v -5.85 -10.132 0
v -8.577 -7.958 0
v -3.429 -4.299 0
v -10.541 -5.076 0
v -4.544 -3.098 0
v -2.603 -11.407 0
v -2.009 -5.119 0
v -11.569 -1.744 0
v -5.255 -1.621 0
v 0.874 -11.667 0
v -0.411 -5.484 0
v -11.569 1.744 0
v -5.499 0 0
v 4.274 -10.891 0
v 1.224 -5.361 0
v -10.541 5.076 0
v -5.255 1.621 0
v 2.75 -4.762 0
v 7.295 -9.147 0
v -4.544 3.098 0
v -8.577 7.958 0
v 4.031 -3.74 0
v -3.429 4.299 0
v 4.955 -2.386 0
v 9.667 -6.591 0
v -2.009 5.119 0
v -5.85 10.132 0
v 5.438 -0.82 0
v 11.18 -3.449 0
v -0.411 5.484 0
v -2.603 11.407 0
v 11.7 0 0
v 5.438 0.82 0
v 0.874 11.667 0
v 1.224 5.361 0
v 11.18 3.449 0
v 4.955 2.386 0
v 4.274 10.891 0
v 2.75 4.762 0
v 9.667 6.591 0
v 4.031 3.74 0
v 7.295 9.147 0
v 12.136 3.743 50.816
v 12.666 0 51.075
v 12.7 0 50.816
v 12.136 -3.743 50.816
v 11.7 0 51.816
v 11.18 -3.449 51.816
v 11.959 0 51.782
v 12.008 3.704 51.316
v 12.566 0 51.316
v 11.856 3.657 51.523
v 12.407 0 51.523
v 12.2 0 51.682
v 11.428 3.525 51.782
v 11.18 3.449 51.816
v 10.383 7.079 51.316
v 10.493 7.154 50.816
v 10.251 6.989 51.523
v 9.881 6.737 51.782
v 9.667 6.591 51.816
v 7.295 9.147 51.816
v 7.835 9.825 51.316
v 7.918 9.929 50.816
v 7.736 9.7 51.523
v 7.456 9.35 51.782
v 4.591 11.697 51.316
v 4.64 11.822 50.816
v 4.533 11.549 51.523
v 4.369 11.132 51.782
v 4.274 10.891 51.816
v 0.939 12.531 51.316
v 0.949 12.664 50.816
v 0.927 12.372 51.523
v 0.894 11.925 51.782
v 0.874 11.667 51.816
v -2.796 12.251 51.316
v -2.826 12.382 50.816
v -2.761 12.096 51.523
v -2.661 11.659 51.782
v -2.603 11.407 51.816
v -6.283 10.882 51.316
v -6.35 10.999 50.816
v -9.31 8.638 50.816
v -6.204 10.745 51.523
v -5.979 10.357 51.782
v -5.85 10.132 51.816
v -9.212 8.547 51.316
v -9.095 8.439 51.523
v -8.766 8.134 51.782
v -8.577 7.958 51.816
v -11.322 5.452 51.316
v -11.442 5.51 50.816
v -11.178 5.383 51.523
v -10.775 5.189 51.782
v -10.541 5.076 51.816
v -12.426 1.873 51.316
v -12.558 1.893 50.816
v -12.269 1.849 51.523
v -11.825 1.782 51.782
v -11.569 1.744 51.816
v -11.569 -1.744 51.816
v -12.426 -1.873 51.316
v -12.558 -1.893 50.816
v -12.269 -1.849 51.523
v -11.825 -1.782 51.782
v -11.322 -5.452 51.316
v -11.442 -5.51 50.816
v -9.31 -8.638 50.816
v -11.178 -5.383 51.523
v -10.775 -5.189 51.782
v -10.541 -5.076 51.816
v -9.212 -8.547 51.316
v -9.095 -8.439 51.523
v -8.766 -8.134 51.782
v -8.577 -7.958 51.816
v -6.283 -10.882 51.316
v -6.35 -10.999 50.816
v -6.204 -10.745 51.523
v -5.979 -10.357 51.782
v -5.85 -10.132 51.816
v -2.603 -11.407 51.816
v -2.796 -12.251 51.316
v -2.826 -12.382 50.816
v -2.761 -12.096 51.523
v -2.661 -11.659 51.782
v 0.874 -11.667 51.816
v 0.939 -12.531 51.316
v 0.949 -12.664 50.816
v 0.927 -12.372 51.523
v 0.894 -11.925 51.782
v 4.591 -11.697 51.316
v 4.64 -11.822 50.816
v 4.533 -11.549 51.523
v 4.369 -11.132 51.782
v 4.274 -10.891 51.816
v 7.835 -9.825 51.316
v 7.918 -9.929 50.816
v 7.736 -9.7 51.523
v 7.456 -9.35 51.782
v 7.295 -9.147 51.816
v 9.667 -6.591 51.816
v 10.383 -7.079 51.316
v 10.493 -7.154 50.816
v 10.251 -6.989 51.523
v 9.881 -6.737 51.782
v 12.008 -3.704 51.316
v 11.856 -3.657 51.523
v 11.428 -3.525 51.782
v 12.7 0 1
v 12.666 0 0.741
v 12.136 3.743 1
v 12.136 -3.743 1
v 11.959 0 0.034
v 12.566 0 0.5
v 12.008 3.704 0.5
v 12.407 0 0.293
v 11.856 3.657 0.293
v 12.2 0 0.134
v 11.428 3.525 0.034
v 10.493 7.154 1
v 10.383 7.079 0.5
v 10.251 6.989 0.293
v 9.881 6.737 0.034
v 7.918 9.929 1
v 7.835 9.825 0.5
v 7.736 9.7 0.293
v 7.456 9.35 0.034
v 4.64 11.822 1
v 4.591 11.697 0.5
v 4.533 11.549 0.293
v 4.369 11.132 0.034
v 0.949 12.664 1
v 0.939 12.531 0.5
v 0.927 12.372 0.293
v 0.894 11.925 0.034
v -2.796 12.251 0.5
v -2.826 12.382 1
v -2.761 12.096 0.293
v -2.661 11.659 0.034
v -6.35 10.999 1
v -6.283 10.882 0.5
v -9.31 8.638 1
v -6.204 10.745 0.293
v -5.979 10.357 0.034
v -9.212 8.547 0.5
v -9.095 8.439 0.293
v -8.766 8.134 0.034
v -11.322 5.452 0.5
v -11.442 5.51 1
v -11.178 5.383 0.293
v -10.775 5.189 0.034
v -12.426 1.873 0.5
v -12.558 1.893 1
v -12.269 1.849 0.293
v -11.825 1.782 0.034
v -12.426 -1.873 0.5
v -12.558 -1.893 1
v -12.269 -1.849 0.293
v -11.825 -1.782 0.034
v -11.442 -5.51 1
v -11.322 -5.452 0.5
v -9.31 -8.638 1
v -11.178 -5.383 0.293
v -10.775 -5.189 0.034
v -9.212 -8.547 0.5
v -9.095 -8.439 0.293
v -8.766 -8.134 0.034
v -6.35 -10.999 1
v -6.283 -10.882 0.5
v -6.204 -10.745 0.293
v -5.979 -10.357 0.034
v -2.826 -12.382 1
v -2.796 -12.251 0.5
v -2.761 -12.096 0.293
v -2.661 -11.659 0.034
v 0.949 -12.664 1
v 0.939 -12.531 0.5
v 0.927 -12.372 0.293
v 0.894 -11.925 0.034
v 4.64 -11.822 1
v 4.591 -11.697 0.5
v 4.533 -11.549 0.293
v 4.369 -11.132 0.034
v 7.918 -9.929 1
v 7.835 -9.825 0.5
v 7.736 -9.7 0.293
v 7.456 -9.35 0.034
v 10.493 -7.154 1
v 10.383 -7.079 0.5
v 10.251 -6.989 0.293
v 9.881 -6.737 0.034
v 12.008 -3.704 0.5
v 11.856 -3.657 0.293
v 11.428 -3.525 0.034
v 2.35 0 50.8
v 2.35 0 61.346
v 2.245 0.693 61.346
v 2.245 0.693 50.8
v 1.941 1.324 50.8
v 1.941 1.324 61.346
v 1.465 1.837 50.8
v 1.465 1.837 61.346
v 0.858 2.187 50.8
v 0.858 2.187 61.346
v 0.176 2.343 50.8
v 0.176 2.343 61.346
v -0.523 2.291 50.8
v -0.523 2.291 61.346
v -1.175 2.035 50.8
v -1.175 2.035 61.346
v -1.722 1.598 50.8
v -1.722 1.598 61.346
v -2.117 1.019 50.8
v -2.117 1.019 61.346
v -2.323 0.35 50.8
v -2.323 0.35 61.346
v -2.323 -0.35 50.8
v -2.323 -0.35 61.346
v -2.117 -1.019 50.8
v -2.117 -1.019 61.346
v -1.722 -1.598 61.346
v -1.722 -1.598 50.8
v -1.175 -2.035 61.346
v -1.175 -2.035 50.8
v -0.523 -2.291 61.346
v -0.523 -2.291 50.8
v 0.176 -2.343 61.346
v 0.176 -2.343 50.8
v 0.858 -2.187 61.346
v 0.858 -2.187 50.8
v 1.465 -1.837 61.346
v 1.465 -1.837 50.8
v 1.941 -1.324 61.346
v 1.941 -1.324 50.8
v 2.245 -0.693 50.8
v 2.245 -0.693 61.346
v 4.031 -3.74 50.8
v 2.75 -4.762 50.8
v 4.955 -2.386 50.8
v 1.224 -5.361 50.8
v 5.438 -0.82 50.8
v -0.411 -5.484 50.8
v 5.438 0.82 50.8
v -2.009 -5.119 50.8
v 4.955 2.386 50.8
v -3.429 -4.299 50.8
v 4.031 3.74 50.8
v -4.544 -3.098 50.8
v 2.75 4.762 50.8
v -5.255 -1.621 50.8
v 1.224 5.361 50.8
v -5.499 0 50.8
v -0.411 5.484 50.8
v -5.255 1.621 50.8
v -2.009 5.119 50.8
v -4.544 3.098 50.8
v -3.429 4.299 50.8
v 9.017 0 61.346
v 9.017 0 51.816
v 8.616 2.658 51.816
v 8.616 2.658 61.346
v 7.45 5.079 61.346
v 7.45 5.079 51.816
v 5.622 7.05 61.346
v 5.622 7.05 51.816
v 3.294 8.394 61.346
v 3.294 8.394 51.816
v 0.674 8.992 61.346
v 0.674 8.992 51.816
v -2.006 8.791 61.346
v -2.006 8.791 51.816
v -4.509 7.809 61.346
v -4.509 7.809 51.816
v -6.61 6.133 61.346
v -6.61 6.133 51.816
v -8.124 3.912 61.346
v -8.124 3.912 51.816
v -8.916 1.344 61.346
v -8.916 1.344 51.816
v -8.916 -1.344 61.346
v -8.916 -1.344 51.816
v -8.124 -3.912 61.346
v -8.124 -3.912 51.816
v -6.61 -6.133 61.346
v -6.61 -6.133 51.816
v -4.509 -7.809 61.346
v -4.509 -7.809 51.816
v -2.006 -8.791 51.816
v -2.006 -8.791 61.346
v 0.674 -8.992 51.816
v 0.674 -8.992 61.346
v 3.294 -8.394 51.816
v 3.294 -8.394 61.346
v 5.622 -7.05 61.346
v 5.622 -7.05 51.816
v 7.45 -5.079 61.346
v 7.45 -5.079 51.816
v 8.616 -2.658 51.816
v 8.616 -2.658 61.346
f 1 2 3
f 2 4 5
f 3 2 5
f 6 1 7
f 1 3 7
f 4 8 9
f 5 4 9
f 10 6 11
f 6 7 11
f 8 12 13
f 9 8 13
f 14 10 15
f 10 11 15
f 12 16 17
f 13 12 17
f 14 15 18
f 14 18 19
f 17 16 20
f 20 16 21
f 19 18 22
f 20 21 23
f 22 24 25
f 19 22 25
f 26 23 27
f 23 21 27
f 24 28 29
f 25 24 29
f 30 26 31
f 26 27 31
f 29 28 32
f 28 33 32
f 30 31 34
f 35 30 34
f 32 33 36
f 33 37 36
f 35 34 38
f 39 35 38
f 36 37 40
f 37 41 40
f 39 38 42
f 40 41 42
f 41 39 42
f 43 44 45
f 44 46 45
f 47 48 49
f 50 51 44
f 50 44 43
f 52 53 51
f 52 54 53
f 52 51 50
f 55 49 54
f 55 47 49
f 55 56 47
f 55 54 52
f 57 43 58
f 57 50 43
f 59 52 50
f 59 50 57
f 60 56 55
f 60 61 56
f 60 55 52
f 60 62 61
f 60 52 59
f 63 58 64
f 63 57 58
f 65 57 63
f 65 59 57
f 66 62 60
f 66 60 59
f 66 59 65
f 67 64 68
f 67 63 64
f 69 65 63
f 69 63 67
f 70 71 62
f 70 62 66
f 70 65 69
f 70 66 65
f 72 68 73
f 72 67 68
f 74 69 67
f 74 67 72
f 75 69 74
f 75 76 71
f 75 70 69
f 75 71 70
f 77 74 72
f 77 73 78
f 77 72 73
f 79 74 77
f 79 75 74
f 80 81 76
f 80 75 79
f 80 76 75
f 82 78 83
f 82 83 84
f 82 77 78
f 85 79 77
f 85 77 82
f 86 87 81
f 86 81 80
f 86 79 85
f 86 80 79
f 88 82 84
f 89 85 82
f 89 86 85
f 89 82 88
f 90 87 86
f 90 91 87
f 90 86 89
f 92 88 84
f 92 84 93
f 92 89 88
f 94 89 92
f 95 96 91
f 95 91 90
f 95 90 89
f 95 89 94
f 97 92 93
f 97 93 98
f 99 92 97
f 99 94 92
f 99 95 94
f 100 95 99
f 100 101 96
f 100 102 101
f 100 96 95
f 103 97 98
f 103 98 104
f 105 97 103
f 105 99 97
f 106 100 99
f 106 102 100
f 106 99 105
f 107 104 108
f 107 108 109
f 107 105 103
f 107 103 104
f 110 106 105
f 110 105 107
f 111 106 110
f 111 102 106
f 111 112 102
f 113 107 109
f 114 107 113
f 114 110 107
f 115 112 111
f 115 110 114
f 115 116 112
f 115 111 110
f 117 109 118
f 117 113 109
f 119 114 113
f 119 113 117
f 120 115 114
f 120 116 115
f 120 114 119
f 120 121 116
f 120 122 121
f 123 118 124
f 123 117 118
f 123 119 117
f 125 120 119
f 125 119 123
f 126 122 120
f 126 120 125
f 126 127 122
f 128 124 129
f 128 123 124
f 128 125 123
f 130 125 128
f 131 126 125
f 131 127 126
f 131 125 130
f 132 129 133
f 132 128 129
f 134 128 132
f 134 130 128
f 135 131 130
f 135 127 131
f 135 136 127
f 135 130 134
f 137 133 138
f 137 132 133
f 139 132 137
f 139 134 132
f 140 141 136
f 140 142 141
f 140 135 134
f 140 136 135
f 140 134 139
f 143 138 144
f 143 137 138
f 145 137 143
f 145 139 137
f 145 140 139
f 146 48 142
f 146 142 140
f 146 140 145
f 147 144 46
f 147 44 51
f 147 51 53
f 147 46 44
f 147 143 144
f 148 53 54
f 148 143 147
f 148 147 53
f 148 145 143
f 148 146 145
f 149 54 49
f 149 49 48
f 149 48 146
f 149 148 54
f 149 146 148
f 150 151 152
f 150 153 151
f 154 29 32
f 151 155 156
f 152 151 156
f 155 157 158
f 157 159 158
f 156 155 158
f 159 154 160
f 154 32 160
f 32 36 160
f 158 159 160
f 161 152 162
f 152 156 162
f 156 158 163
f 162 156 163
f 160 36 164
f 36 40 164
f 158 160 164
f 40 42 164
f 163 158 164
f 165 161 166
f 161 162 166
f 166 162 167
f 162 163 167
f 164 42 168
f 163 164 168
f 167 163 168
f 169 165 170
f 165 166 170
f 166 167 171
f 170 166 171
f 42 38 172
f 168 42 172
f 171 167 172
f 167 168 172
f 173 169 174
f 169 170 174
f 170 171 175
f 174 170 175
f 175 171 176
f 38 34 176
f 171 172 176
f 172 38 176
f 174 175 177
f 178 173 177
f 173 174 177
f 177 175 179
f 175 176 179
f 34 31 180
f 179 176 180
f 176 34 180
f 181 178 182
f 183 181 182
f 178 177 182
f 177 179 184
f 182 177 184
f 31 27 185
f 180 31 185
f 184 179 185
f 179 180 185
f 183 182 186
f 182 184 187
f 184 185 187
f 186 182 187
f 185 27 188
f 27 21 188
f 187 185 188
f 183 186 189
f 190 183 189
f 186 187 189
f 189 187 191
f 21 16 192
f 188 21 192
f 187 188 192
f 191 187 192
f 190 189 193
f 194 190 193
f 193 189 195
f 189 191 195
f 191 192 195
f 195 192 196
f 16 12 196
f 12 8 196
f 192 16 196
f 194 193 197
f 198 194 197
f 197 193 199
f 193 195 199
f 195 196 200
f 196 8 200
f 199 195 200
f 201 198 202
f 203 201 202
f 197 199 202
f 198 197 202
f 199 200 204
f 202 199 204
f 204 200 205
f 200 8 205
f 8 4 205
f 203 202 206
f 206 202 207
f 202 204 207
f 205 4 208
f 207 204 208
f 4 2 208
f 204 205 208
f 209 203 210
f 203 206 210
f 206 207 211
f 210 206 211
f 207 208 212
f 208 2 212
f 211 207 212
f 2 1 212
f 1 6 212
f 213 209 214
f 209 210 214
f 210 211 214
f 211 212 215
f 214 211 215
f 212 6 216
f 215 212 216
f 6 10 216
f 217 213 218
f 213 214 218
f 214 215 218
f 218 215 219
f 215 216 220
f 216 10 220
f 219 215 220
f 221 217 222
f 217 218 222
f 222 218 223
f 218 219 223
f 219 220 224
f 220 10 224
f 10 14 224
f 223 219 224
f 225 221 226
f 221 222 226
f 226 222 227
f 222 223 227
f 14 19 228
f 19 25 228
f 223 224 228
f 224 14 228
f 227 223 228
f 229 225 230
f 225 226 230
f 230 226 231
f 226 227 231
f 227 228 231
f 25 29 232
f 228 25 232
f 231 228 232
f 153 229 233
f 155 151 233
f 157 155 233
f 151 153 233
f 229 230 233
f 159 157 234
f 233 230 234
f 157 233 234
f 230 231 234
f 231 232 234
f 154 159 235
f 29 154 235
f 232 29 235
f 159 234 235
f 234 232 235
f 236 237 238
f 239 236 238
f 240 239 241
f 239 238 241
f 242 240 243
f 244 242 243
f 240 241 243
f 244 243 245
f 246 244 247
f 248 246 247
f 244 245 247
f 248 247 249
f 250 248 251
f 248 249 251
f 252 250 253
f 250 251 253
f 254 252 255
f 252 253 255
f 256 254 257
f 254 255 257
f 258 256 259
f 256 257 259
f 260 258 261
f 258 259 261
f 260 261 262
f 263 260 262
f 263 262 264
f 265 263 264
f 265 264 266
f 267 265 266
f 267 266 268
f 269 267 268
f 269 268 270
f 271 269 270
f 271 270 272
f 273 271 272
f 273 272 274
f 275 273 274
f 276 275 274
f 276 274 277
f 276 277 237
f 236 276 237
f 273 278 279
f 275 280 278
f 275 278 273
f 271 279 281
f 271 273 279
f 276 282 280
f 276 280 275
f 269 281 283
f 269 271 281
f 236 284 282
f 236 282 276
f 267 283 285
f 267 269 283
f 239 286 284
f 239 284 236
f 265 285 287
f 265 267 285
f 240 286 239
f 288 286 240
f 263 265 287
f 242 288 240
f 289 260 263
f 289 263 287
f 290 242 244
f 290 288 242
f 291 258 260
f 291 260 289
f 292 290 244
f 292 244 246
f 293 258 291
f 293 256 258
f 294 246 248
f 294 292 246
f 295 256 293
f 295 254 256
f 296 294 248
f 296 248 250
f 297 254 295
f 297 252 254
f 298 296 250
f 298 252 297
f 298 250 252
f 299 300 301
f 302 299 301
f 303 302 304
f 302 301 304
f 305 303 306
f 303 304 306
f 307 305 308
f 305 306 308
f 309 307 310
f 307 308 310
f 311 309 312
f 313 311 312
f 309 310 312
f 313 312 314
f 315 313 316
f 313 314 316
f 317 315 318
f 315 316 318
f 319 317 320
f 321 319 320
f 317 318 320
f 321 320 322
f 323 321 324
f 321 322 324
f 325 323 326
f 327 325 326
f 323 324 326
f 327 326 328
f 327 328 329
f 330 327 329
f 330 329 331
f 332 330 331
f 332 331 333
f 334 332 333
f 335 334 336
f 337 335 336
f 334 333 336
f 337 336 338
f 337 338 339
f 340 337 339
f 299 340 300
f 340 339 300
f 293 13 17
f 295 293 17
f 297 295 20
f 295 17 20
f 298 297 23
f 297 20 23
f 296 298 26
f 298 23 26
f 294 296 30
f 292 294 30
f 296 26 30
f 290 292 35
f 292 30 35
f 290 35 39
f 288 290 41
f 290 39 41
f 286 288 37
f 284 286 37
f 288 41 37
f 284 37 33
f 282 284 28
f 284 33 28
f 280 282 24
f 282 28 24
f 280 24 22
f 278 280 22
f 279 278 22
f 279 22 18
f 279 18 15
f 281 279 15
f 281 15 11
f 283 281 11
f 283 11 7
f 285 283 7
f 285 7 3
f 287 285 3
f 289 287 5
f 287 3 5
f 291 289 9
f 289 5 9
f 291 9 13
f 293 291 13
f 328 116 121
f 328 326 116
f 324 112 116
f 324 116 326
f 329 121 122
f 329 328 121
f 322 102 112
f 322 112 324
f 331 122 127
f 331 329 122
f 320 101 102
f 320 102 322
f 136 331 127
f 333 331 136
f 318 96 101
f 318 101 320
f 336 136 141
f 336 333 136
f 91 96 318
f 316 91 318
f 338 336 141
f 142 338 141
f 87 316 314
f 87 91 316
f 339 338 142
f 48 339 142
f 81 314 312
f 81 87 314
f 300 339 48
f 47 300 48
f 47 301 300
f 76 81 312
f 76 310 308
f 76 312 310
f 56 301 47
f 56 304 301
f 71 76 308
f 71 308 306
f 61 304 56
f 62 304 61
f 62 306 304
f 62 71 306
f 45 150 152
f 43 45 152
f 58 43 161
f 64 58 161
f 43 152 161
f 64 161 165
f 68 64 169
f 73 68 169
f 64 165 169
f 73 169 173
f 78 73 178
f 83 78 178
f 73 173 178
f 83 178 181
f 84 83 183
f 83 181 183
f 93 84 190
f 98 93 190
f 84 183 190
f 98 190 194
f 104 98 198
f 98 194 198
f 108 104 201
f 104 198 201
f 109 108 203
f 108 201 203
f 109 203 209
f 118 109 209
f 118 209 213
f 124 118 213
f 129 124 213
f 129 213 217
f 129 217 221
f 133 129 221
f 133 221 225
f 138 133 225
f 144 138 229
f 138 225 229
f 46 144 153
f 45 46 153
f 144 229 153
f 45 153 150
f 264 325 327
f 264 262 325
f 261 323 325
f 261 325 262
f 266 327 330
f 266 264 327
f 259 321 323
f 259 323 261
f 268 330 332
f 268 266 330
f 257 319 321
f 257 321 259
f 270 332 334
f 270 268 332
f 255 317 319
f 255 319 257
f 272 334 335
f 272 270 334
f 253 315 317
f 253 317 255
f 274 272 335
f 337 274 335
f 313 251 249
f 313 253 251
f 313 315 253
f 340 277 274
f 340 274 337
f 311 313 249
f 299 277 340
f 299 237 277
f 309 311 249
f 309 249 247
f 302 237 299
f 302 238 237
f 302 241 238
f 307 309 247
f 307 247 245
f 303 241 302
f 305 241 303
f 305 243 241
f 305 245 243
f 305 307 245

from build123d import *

# Parameters (mm, degrees)
SKETCH1_R           = 12.7
BOSS_EXTRUDE1_DEPTH = 51.816
FILLET1_R           = 1
SKETCH2_R           = 9.017
BOSS_EXTRUDE3_DEPTH = 9.53
SKETCH5_R           = 5.4991
CUT_EXTRUDE1_DEPTH  = 50.8
SKETCH6_R           = 2.3495
CUT_EXTRUDE2_DEPTH  = 50.8


with BuildPart() as part:
    # Sketch1 → Boss-Extrude1 (new body)
    with BuildSketch(Plane.XY):
        Circle(SKETCH1_R)
    extrude(amount=BOSS_EXTRUDE1_DEPTH)

    # Fillet1
    fillet1_edges = [part.edges().sort_by_distance(p)[0] for p in [
        (-12.7, 0, 0),
        (-12.7, 0, 51.816),
    ]]
    fillet(fillet1_edges, radius=FILLET1_R)

    # Sketch2 → Boss-Extrude3 (add)
    with BuildSketch(Plane.XY.offset(51.816)):
        Circle(SKETCH2_R)
    extrude(amount=BOSS_EXTRUDE3_DEPTH)

    # Sketch5 → Cut-Extrude1 (cut)
    with BuildSketch(Plane(origin=(0, 0, 0), x_dir=(-1, 0, 0), z_dir=(0, 0, -1))):
        Circle(SKETCH5_R)
    extrude(amount=-CUT_EXTRUDE1_DEPTH, mode=Mode.SUBTRACT)

    # Sketch6 → Cut-Extrude2 (cut)
    with BuildSketch(Plane.XY.offset(61.346)):
        Circle(SKETCH6_R)
    extrude(amount=-CUT_EXTRUDE2_DEPTH, mode=Mode.SUBTRACT)


solid = part.part
